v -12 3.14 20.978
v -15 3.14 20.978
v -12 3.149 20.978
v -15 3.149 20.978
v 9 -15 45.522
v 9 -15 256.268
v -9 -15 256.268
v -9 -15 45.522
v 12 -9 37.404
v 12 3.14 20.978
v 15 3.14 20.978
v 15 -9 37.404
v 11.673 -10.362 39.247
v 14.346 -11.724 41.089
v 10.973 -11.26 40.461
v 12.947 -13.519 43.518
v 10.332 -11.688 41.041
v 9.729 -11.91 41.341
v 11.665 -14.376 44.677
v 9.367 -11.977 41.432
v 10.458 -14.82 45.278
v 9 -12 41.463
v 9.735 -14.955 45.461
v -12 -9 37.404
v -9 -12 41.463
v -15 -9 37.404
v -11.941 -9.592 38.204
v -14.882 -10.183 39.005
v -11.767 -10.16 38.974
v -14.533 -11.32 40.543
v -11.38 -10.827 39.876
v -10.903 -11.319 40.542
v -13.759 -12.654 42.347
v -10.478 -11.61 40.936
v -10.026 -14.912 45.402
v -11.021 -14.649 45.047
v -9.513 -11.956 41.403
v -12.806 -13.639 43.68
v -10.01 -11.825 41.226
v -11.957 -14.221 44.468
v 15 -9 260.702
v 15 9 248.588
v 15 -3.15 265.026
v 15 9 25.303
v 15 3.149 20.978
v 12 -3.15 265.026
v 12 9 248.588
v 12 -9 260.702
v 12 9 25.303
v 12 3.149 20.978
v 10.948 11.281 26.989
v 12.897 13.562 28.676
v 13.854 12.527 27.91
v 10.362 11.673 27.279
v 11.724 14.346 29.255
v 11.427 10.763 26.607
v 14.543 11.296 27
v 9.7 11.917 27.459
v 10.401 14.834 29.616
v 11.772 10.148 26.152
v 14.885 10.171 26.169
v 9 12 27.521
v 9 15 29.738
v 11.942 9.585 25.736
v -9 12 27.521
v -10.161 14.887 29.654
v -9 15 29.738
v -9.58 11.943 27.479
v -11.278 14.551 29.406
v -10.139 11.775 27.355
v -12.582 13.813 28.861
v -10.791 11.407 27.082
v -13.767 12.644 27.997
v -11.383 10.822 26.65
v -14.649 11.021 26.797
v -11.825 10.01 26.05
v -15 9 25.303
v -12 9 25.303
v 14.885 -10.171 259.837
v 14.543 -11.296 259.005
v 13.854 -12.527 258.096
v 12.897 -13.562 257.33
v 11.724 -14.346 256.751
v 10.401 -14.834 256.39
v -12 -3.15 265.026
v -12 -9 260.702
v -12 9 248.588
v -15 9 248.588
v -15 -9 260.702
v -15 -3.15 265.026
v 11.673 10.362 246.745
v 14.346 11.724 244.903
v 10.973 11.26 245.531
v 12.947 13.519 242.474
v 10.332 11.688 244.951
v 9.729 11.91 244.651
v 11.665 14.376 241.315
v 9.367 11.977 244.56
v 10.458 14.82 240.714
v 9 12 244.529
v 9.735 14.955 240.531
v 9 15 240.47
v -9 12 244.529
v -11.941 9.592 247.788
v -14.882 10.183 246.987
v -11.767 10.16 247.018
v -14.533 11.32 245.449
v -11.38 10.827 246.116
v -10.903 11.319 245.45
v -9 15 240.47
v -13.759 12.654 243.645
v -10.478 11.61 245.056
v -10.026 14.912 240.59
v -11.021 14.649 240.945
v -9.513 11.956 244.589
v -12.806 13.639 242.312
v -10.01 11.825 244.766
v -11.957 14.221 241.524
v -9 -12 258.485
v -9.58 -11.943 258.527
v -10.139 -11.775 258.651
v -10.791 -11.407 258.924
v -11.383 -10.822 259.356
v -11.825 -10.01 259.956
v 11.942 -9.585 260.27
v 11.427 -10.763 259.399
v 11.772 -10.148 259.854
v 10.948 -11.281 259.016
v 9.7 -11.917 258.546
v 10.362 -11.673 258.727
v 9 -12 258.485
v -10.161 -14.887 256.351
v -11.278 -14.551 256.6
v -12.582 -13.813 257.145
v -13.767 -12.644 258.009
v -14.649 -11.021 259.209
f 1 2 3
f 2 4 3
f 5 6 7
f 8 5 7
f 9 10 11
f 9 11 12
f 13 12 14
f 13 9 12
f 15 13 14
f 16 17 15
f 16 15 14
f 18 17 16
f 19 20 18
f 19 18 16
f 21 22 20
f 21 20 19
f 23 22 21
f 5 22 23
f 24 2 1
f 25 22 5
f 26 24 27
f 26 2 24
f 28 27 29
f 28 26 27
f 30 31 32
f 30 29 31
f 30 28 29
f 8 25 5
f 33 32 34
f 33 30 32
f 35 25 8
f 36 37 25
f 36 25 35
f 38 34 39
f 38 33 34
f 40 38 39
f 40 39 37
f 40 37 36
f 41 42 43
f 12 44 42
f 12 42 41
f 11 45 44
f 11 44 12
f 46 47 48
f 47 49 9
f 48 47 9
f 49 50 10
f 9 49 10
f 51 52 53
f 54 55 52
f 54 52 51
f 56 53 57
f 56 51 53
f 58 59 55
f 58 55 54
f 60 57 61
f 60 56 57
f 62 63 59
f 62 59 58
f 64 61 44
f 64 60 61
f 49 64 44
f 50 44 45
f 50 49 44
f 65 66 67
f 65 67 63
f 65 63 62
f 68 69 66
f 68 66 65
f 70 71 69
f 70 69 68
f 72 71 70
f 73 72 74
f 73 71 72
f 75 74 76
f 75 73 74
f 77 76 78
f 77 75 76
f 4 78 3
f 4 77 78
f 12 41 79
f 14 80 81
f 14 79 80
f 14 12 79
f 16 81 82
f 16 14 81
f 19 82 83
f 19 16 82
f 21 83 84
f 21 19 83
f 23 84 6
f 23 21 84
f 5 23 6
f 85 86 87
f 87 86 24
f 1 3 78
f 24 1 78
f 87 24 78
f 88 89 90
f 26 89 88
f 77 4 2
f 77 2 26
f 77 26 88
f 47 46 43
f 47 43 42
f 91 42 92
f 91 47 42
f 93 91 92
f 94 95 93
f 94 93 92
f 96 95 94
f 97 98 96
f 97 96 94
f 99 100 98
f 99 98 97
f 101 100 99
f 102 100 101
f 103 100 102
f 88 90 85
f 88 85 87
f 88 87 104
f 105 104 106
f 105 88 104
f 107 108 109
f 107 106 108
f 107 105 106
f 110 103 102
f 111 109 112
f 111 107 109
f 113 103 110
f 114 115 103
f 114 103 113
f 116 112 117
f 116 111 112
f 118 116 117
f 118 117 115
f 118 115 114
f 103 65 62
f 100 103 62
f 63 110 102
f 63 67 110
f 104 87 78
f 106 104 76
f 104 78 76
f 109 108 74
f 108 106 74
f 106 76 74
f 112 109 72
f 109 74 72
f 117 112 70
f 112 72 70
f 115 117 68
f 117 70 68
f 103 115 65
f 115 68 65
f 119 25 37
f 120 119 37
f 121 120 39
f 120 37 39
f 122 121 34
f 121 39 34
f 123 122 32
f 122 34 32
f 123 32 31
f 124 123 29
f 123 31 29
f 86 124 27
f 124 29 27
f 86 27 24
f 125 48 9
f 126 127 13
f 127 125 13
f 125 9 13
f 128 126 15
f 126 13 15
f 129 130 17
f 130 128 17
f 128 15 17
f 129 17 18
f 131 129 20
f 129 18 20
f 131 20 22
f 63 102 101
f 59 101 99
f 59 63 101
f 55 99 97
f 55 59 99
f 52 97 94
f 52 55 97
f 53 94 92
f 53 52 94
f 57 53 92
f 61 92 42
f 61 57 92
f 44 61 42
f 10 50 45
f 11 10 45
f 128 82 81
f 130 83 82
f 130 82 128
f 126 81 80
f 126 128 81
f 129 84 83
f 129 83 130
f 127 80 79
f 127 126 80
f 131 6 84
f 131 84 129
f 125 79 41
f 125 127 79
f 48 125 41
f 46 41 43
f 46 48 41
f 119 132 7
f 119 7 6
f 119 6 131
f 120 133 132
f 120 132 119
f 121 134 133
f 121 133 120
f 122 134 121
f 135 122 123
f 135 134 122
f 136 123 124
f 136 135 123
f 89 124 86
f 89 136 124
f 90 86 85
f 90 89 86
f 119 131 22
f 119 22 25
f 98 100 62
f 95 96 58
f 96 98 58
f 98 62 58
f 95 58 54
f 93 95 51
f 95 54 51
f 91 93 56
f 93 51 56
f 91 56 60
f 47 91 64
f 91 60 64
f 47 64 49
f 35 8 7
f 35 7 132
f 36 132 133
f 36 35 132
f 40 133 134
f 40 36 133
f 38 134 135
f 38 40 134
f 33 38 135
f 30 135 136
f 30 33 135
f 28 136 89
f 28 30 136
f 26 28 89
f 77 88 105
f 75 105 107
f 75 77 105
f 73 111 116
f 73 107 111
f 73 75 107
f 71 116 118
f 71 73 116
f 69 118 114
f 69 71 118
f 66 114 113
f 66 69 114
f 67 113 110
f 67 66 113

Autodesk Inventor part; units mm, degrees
ref_plane "Start plane" through (0, 0, 20.9785) normal (0, 0, 1) x (1, 0, 0)
ref_plane "End plane" through (0, 0, 265.0285) normal (0, 0, 1) x (1, 0, 0)
sketch "Sketch" plane through (0, 0, 0) normal (0, 0, 1) x (1, 0, 0)
  line L0 (-15, -9) -> (-15, 9)
  line L1 (-9, 15) -> (9, 15)
  line L2 (15, 9) -> (15, -9)
  line L3 (9, -15) -> (-9, -15)
  arc A0 (-15, -9) -> (-9, -15) centre (-9, -9) ccw
  arc A1 (-9, 15) -> (-15, 9) centre (-9, 9) ccw
  arc A2 (15, 9) -> (9, 15) centre (9, 9) ccw
  arc A3 (9, -15) -> (15, -9) centre (9, -9) ccw
  arc A4 (-9, 12) -> (-12, 9) centre (-9, 9) ccw
  line L4 (-9, 12) -> (9, 12)
  arc A5 (12, 9) -> (9, 12) centre (9, 9) ccw
  line L5 (12, 9) -> (12, -9)
  arc A6 (9, -12) -> (12, -9) centre (9, -9) ccw
  line L6 (9, -12) -> (-9, -12)
  arc A7 (-12, -9) -> (-9, -12) centre (-9, -9) ccw
  line L7 (-12, -9) -> (-12, 9)
  line L8 (0, 22.7397) -> (0, -22.7397) construction
  line L9 (-22.7397, 0) -> (22.7397, 0) construction
  dimension "d7" = 6
  dimension "d10" = 30
  dimension "d11" = 30
  dimension "d12" = 3
  dimension "d15" = 15
  dimension "d16" = 15
extrude "Body" add sketch "Sketch" along normal up to surface (244.05 mm away) from surface at 20.9785
sketch "Sketch3" plane through (0, 0, 0) normal (0, 0, 1) x (1, 0, 0)
  line L0 (0, 0) -> (10, 0)
ref_plane "Work Plane3" through (0, 0, 0) normal (0, -1, 0) x (1, 0, 0)
ref_plane "Work Plane4" through (9, -130.3465, -77.6904) normal (0, 0.5944, -0.8042) x (1, 0, 0)
split "Split1" plane through (9, -130.3465, -77.6904) removes the side toward (0, 0.5944, -0.8042)
ref_plane "Work Plane5" through (9, -433.7307, 612.048) normal (0, -0.8042, -0.5944) x (1, 0, 0)
split "Split2" plane through (9, -433.7307, 612.048) removes the side toward (0, -0.8042, -0.5944)
ref_plane "Work Plane6" through (-9, -321.146, 695.2627) normal (0, 0.8042, 0.5944) x (1, 0, 0)
split "Split3" plane through (-9, -321.146, 695.2627) removes the side toward (0, 0.8042, 0.5944)
ref_plane "Work Plane7" through (9, 8.9159, 273.9444) normal (0, -0.5944, 0.8042) x (1, 0, 0)
split "Split4" plane through (9, 8.9159, 273.9444) removes the side toward (0, -0.5944, 0.8042)
sketch "Sketch4" plane through (0, 0, 0) normal (0, -1, 0) x (1, 0, 0)
  line L0 (-2, 20.9785) -> (12, 20.9785) projected
  line L1 (-2, 265.0285) -> (12, 265.0285) projected
  dimension "d18" = 244.05
equation "\"d7\" = G_IR"
equation "\"d10\" = G_H"
equation "\"d11\" = G_W"
equation "\"d12\" = G_T"
equation "\"d15\" = 0.5 * d10"
equation "\"d16\" = 0.5 * d11"
equation "\"d3\" = G_L"
equation "\"G_W\" = 30"
equation "\"G_H\" = 30"
equation "\"G_T\" = 3"
equation "\"G_IR\" = 6"
equation "\"G_L\" = d18"
equation "\"G_OFFSET_START\" = -20.97851"
equation "\"G_OFFSET_END\" = -20.97851"
equation "\"d13\" = -G_OFFSET_START"
equation "\"d14\" = G_OFFSET_END + B_L"
equation "\"B_L\" = 286.00699"
properties part number "DIN EN 10219-2 - 30 x 30 x 3  - 244.05" material "Steel, Mild"
